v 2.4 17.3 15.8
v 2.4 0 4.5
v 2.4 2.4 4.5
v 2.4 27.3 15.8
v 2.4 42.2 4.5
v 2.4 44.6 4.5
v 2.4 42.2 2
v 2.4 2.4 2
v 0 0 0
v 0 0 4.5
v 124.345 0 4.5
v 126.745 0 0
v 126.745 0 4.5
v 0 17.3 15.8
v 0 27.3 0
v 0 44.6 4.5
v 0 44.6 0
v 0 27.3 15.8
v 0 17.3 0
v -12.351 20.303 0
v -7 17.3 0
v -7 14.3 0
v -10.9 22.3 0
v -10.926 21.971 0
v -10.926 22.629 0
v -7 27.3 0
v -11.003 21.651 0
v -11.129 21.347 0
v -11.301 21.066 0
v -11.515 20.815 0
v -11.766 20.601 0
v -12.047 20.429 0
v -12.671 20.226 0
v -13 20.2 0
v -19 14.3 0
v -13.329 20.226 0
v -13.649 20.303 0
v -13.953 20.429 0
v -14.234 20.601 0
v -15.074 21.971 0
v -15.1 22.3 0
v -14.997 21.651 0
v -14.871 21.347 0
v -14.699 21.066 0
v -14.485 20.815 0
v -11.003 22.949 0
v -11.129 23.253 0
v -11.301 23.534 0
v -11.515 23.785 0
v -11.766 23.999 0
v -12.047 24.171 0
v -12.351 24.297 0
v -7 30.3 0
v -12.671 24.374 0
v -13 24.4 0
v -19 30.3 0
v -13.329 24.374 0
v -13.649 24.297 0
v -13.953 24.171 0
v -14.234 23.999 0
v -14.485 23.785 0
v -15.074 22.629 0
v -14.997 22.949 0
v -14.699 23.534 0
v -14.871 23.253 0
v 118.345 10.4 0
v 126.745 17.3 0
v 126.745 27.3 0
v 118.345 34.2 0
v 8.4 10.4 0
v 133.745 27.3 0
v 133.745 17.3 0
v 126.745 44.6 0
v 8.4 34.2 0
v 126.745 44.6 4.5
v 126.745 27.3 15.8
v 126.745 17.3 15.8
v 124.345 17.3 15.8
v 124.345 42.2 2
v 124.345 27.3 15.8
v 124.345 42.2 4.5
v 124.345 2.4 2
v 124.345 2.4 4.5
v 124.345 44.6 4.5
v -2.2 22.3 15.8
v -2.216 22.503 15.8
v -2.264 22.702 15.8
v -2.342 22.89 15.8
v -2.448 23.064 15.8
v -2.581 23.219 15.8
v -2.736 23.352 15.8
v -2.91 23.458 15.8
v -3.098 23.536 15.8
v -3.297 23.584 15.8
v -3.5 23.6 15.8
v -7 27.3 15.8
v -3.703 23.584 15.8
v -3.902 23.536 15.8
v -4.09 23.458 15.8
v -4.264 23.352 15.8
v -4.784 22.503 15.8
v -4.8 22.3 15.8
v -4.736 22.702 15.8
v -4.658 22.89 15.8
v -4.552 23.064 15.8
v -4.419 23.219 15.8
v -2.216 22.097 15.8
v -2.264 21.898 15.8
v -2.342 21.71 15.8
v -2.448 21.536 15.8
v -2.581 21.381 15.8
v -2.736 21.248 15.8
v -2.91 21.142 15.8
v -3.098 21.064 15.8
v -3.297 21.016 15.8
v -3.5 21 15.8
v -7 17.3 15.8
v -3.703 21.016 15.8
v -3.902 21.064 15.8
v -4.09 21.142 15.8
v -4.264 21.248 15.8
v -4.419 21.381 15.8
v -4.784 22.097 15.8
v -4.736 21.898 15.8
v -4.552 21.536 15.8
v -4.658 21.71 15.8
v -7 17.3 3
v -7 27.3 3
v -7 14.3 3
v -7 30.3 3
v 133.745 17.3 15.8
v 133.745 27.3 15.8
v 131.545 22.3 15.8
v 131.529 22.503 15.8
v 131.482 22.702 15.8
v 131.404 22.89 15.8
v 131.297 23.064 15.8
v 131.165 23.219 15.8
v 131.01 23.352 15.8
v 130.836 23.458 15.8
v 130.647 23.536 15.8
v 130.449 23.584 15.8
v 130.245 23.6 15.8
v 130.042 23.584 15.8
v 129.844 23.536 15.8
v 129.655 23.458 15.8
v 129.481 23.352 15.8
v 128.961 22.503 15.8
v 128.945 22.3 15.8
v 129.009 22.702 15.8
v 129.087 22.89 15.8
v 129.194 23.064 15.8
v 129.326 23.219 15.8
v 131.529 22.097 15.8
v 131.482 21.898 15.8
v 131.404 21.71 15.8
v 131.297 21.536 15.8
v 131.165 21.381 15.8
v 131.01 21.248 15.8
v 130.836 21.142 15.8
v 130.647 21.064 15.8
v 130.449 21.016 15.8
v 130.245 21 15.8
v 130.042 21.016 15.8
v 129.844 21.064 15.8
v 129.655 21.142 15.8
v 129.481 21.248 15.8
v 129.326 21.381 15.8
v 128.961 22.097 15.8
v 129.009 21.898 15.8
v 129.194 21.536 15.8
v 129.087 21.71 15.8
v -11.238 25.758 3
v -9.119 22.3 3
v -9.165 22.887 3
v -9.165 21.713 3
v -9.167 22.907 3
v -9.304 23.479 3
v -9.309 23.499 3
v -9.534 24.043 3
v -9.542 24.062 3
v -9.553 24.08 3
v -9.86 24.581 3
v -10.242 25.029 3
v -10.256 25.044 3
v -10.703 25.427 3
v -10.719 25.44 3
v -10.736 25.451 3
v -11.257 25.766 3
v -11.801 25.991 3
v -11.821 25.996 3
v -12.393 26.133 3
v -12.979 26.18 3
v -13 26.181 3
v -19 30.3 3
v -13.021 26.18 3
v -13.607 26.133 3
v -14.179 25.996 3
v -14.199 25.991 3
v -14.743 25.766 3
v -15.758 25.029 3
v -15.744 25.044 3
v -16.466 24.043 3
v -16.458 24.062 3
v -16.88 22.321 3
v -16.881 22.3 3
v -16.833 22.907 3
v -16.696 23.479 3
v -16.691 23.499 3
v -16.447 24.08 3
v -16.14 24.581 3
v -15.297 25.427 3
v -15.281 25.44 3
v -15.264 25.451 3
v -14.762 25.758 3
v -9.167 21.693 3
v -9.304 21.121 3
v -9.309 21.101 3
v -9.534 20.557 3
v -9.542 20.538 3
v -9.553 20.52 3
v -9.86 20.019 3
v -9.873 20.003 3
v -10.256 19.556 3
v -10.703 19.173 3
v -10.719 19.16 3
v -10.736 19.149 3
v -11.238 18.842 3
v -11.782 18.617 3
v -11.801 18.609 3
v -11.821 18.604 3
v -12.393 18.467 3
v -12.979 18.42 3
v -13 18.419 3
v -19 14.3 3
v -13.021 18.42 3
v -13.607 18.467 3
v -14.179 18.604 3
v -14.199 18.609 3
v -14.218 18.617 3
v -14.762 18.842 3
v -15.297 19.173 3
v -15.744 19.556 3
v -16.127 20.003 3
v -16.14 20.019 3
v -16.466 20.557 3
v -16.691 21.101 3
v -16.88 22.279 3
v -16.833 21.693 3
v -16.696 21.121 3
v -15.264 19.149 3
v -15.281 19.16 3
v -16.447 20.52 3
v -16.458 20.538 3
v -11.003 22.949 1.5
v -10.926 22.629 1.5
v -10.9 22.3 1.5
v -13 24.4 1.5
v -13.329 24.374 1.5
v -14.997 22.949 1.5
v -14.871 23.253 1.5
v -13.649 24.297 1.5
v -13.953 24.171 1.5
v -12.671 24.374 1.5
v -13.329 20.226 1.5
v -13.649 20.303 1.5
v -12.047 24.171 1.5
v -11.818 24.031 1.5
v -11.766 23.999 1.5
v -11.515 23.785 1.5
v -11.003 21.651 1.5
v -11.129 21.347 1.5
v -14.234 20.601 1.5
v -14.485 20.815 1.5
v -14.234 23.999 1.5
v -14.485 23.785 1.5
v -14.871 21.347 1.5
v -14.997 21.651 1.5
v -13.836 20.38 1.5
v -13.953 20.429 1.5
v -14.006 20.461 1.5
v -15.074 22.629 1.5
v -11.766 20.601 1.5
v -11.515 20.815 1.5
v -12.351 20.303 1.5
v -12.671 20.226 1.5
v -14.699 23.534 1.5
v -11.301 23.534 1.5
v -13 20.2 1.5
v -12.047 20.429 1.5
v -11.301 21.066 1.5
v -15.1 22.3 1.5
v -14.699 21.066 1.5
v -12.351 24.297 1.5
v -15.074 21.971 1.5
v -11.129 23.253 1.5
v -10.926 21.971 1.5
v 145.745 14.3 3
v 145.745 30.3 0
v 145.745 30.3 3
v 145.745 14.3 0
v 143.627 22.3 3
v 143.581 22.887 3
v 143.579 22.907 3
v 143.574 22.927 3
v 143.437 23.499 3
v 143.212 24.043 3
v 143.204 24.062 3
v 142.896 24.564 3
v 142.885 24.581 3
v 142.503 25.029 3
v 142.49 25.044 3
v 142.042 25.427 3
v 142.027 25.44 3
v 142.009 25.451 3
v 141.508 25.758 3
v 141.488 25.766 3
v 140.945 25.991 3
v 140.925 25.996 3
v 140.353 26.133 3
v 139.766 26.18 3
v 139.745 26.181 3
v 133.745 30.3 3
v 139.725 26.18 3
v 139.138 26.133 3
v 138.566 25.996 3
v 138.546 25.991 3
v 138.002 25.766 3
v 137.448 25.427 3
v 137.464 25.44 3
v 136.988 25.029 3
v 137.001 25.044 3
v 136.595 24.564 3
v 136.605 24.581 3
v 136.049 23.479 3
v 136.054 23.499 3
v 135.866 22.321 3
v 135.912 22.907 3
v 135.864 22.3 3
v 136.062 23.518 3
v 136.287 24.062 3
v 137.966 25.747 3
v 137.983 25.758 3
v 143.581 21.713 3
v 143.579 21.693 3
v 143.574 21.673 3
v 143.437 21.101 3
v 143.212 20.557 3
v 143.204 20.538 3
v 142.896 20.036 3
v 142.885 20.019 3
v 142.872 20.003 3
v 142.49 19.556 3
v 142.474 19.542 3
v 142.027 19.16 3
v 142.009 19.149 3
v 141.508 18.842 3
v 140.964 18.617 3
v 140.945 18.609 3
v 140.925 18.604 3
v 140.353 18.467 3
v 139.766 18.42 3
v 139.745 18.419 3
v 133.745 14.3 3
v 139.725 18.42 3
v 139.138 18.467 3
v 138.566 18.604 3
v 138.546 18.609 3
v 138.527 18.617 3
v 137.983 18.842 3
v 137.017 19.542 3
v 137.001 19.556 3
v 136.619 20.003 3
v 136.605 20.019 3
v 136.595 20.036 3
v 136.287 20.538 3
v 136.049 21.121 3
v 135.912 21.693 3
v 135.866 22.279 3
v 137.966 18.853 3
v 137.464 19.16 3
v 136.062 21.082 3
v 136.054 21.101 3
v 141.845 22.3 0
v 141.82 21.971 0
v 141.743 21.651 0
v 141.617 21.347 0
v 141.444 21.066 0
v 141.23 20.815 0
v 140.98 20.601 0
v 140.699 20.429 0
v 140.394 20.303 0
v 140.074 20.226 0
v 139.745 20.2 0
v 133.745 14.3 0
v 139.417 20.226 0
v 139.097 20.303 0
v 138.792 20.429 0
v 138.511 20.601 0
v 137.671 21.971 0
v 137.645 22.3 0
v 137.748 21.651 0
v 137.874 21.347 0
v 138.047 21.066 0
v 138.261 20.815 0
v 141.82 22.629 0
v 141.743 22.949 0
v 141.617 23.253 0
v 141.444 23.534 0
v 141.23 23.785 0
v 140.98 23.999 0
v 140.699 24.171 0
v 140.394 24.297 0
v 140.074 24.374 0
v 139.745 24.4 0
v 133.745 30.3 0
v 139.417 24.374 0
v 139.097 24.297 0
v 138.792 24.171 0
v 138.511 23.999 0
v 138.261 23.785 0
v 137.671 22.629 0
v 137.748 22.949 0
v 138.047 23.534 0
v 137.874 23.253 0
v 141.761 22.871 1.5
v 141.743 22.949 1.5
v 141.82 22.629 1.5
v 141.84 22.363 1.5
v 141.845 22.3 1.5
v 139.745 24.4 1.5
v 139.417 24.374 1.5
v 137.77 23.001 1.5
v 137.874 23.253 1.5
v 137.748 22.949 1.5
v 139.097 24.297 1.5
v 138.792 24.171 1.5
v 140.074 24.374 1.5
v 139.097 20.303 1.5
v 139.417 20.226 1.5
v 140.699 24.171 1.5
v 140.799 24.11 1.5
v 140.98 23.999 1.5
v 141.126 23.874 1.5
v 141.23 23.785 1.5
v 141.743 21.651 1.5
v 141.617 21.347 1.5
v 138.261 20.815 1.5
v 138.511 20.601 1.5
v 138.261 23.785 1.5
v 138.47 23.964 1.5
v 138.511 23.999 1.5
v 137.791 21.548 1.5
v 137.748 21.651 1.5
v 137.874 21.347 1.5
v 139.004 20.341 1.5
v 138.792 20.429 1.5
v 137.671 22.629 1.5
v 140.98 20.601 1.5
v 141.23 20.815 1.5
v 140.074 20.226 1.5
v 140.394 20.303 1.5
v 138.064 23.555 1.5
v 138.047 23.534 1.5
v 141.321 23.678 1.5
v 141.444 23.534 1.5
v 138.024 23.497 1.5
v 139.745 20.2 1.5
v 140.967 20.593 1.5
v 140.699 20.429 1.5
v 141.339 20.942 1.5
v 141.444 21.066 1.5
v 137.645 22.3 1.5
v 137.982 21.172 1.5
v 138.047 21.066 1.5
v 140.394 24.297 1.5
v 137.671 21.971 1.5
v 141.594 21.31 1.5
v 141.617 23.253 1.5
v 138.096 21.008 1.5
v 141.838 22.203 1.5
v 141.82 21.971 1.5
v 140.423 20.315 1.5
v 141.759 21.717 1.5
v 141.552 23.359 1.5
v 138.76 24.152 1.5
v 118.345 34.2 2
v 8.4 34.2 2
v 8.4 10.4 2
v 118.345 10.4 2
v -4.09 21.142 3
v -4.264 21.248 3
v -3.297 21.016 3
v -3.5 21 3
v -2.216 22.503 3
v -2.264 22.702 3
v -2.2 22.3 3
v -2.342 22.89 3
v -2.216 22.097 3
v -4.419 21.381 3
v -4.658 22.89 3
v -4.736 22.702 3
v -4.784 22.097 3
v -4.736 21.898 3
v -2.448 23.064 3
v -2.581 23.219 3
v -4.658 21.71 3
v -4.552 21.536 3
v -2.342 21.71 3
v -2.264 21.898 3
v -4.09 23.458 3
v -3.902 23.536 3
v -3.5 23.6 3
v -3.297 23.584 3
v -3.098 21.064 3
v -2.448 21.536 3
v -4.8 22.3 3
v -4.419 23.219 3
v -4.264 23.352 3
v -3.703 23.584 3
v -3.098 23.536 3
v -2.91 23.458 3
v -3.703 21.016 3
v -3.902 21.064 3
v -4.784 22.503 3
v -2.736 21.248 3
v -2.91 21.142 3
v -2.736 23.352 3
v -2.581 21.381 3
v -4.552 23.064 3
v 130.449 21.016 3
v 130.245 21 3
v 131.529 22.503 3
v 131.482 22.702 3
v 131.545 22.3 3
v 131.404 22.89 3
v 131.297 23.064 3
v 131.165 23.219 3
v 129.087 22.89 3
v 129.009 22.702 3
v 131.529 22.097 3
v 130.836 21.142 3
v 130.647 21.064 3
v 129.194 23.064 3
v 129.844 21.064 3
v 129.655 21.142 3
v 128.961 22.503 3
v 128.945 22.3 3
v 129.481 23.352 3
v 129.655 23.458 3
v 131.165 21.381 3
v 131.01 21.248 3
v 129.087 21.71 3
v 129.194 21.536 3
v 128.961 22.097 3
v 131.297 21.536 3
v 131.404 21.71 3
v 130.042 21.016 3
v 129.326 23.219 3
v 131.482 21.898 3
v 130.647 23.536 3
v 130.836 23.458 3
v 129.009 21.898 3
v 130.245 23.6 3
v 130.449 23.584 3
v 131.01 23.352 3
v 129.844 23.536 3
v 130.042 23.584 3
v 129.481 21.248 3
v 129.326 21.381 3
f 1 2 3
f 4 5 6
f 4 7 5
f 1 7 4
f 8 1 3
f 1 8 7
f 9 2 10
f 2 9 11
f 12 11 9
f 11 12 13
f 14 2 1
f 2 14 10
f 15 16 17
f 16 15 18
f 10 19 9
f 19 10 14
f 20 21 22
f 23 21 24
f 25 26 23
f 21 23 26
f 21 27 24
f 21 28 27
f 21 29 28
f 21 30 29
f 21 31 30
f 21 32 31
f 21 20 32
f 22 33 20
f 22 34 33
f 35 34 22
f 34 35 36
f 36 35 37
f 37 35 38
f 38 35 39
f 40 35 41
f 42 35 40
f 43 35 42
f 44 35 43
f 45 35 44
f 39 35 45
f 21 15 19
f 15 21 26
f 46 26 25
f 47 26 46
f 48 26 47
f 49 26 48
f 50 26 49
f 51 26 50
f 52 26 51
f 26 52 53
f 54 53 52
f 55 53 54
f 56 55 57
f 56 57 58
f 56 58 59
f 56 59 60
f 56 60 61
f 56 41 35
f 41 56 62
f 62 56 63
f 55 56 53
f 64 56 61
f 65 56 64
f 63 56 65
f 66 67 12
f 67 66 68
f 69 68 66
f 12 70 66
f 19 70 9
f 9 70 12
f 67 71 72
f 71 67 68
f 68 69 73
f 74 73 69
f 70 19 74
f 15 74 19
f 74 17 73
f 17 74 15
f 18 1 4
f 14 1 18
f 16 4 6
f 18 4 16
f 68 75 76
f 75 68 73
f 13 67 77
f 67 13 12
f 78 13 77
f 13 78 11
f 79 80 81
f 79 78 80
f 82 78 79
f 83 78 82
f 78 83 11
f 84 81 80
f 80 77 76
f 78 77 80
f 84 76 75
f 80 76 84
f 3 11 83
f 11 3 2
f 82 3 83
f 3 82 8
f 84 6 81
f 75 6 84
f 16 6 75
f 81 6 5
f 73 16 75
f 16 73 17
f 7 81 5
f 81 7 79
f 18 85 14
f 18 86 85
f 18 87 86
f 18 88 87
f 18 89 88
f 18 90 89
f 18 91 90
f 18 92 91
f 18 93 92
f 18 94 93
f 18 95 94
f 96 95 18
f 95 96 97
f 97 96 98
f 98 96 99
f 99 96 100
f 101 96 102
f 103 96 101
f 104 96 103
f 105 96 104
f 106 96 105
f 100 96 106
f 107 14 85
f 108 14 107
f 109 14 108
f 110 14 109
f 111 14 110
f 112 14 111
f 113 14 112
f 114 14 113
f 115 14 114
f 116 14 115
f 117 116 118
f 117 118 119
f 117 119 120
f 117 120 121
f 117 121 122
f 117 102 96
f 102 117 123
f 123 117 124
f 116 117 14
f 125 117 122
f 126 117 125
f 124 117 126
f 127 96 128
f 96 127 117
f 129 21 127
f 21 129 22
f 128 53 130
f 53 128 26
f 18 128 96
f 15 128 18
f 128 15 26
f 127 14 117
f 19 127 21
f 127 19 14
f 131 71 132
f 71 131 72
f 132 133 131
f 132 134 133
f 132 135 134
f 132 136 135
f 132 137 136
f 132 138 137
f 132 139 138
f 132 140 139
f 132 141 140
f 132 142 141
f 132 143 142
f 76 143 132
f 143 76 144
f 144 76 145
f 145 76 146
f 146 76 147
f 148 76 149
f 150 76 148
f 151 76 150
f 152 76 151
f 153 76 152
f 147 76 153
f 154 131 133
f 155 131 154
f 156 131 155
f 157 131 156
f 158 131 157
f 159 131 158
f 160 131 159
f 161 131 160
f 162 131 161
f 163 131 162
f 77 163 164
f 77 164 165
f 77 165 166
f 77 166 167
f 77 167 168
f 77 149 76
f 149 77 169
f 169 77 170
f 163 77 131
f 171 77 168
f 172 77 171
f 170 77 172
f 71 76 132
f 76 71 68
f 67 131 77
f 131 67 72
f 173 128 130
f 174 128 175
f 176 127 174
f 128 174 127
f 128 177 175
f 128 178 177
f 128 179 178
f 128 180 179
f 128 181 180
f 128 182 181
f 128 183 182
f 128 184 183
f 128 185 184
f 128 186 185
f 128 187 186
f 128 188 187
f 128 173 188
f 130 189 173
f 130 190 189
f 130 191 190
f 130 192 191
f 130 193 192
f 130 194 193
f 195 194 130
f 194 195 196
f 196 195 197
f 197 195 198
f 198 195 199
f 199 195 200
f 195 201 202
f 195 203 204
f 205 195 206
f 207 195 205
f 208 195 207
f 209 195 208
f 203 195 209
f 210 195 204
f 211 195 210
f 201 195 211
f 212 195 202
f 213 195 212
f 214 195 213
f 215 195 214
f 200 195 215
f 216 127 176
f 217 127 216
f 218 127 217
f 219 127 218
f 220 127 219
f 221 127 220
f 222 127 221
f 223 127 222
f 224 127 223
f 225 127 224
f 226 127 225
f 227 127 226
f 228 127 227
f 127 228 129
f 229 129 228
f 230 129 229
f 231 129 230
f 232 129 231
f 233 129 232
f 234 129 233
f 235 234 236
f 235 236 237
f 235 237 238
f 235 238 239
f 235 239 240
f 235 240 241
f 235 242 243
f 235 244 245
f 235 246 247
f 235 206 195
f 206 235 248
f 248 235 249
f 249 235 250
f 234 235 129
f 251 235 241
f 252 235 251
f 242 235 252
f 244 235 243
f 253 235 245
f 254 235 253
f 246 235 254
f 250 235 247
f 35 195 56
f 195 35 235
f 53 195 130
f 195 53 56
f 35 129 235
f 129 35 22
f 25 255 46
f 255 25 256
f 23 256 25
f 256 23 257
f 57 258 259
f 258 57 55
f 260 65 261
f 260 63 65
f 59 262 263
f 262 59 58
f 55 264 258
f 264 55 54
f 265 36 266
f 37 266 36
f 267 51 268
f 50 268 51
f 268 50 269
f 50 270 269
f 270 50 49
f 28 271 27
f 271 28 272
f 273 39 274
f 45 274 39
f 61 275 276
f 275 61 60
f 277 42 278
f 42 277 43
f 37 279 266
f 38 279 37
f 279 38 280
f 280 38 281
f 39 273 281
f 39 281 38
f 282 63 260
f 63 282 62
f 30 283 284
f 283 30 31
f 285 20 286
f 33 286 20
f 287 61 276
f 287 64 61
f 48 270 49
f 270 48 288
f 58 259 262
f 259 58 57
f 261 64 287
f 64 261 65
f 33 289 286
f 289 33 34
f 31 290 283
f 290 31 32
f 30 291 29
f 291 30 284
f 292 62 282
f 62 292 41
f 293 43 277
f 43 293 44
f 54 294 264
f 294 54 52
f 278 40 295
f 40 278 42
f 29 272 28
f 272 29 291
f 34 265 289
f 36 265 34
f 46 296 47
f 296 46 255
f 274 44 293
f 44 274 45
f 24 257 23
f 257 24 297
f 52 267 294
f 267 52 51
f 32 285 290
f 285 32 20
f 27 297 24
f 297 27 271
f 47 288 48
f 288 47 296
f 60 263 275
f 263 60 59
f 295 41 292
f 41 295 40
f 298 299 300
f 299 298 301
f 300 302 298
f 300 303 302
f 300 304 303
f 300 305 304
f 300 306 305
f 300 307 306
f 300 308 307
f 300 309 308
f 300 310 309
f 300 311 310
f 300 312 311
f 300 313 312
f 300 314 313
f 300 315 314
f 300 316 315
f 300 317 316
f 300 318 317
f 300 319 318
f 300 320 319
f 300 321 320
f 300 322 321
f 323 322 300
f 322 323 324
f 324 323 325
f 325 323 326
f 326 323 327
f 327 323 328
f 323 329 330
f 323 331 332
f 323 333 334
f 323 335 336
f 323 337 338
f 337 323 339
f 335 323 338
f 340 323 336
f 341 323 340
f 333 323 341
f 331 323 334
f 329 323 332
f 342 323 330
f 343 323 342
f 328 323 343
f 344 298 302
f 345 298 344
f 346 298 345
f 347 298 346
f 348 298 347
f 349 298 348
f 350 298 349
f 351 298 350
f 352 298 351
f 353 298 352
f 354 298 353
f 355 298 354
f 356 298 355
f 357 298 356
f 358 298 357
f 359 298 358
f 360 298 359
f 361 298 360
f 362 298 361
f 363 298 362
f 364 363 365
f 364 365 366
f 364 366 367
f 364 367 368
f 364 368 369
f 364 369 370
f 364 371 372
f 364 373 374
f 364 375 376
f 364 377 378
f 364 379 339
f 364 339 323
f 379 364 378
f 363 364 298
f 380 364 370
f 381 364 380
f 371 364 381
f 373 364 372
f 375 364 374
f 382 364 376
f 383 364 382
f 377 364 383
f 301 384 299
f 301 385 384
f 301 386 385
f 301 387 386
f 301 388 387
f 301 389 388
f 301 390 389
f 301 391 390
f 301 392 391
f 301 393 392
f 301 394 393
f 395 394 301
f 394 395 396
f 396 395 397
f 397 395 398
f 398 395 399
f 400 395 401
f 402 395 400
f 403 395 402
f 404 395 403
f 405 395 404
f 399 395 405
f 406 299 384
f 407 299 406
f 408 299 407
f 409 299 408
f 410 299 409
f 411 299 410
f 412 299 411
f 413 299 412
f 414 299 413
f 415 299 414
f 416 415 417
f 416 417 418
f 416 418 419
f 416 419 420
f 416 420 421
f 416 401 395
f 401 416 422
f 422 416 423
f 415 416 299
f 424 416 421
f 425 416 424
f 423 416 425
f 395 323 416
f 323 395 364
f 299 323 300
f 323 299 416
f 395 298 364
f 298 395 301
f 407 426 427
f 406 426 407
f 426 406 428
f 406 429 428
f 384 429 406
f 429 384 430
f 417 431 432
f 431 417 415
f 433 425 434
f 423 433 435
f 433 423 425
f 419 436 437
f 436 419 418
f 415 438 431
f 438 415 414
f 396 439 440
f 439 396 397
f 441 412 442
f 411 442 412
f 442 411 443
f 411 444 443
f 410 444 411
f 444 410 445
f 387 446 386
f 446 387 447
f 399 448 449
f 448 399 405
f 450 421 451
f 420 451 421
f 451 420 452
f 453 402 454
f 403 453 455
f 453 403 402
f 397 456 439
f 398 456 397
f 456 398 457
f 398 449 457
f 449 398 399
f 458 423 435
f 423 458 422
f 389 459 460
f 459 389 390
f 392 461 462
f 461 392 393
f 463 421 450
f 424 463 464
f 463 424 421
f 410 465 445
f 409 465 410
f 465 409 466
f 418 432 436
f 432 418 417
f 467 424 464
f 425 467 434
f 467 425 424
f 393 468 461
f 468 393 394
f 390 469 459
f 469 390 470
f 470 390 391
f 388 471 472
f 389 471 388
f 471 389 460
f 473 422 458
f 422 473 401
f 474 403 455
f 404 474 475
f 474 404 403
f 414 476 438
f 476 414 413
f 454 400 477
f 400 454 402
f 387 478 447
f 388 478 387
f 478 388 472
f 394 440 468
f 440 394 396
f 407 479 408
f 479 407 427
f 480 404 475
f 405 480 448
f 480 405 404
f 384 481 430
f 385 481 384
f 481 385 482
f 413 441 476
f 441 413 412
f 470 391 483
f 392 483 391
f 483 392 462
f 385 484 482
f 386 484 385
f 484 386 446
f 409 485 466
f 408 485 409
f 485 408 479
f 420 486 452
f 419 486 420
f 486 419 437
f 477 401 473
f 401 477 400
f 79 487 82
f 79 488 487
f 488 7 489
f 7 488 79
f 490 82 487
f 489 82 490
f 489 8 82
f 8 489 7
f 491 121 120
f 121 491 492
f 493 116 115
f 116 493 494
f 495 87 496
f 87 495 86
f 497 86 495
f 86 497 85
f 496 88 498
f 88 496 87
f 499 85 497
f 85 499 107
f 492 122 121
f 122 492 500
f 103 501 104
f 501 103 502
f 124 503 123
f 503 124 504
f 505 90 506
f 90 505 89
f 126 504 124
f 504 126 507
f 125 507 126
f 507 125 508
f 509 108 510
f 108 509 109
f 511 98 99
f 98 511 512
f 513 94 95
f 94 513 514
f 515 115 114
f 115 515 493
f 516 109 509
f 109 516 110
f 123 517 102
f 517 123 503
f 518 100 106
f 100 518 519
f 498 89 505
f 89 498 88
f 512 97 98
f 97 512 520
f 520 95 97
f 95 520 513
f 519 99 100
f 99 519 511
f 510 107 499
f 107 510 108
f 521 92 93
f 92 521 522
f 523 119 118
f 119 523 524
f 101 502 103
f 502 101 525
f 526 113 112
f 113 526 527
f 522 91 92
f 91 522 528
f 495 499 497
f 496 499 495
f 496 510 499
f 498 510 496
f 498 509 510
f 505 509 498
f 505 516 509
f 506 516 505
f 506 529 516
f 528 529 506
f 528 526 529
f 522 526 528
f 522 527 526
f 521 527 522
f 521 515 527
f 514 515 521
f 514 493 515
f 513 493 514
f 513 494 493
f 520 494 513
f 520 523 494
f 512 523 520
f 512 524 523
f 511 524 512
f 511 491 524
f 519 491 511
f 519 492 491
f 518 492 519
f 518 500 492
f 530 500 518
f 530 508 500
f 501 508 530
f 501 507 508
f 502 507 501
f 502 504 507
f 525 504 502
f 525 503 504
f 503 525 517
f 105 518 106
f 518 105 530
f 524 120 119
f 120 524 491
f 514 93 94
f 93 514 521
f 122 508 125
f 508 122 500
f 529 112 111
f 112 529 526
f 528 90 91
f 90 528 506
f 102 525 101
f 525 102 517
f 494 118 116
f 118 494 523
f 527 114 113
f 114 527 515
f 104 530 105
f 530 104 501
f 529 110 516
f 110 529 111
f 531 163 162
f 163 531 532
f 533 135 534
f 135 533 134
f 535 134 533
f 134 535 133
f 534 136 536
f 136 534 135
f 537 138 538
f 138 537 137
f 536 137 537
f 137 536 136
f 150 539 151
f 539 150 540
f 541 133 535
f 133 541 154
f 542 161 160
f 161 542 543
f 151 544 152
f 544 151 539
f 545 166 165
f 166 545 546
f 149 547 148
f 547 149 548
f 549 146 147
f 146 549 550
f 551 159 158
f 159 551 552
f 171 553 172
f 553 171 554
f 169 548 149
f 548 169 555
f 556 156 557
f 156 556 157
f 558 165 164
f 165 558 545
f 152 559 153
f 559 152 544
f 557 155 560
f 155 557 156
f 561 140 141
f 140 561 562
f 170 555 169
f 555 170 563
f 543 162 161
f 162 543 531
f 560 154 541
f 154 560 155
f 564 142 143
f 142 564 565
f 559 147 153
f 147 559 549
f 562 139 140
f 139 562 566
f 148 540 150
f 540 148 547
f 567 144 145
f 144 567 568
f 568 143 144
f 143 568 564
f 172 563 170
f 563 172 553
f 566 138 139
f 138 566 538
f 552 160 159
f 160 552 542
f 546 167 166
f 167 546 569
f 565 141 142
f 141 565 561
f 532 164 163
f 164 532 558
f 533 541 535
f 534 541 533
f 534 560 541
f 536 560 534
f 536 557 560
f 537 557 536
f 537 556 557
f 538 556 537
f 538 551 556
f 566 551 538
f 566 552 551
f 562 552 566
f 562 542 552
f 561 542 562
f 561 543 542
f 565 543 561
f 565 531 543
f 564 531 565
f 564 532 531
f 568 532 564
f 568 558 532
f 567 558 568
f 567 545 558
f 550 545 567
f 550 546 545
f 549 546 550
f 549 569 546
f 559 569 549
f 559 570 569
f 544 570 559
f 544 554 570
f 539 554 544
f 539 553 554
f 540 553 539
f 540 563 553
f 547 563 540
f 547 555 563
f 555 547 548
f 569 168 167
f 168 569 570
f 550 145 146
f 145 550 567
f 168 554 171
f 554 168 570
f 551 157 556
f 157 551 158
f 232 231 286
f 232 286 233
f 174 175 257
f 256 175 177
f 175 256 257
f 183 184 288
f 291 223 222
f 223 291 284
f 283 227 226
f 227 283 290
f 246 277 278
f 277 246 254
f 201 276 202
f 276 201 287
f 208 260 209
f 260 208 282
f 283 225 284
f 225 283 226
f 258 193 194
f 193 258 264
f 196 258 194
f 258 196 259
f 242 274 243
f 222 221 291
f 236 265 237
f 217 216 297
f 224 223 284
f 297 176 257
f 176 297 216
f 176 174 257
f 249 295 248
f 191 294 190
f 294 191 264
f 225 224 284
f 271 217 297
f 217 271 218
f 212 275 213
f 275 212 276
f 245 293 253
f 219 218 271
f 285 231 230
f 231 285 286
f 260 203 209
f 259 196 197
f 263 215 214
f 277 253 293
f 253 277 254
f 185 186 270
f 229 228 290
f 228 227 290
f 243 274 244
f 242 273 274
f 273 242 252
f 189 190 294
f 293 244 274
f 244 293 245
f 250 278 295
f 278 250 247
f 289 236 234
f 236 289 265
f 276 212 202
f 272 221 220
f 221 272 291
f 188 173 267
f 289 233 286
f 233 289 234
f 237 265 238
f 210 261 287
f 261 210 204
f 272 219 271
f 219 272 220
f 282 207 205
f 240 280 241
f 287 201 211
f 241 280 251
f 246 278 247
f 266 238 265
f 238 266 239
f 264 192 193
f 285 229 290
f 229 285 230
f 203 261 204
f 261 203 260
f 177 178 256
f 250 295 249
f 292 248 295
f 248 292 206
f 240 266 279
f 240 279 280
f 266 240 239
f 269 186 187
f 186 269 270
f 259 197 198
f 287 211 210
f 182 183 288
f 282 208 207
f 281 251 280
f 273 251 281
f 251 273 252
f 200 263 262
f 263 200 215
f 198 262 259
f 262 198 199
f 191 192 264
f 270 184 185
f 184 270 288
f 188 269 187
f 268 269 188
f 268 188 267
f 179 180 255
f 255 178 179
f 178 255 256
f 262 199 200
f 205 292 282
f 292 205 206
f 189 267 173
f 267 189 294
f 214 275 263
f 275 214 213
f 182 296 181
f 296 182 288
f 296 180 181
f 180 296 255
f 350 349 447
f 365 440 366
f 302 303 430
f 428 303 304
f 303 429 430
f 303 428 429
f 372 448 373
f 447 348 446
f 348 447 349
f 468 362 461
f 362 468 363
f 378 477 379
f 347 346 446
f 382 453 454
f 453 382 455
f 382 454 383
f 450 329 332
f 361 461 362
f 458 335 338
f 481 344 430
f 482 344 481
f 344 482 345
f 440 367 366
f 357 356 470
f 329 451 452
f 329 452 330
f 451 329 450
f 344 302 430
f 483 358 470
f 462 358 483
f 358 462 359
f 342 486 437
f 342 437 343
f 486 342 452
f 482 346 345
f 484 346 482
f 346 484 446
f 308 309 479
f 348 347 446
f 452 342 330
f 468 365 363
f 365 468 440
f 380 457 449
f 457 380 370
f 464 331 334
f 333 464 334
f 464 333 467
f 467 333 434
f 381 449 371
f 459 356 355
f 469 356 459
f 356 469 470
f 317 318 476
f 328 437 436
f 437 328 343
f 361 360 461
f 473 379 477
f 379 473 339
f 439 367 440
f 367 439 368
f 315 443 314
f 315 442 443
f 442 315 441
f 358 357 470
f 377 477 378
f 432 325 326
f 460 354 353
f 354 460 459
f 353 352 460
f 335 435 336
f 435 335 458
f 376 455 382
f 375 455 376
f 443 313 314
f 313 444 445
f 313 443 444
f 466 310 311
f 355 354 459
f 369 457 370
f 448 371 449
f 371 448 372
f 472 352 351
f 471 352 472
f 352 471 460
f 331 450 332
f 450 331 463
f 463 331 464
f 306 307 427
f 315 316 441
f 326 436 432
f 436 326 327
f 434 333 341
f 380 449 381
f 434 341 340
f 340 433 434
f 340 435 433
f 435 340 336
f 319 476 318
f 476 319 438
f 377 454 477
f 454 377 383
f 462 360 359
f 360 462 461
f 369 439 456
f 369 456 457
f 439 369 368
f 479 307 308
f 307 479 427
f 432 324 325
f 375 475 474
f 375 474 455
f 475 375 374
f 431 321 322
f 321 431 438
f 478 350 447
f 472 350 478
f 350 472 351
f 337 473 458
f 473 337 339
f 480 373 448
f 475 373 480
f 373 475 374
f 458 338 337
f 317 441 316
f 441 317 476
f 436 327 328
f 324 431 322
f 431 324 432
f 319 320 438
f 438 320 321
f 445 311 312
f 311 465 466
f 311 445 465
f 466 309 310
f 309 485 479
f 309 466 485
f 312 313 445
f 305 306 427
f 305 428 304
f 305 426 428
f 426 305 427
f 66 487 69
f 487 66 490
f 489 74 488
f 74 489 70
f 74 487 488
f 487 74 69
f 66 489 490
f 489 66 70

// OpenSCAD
// Holder for 14 lever splice connectors (Adafruit 5619, inline 1-in/1-out)
// clipped together side by side, for the keypad wires.
// Measured block of 11 (Andrew): 95.5 wide x 39.4 long (wire direction); 13 = about 112.8
// x 14.75 tall. Open top so the levers work; wires leave both long sides.
//
// The block drops into the tray. A strap across the middle, between the
// levers, has a short peg that goes into the hole on top of each connector,
// and screws down onto the two end walls (M3 x 10 or #4 x 3/8" self-tapping).
//
// part = "fittest"       : tray only 2 connectors wide   } print these two
// part = "strap_fittest" : matching 2-connector strap     } first
// part = "holder"        : the real tray for 14
// part = "strap"         : the real strap for 14
// part = "both"          : preview, strap in place
// Print flat, no supports. The strap prints pegs up.

part = "holder";

count    = 14;            // 6 for the LED-strip holder (-D count=6)
each_w   = 95.5 / 11;     // 8.68 mm per connector: 11 measured 95.5, fit test 2 perfect (13 = about 112.8)
block_w  = count * each_w;
block_l  = 39.4;          // along the wires
block_h  = 14.75;

// ---- groove and hole on top of each connector (Andrew, 2026-10-29) ----
groove_w = 5.5;           // measured: groove across the top for a strap
groove_z = 13.8;          // measured 14.8 (connector bottom to groove floor); Andrew asked 1 mm lower after fit test 2
hole_d   = 2.74;          // measured: round hole in the groove
peg_d    = 2.65;           // peg is a little smaller than the hole
peg_h    = 2.0;           // how deep the peg goes into the hole
hole_y   = 0;             // hole centre offset from the connector's middle, along the wires
hole_x   = 0;             // hole centre offset from the connector's middle, across it

clear_w  = 0.4;           // total extra room across the block
clear_l  = 0.4;           // total extra room along the wires
wall     = 2.4;
floor_t  = 2.0;
side_lip_h = 2.5;         // low lips on the wire sides (keep below the wire holes)
boss_w   = 10;            // screw boss on each end wall, under the strap
boss_t   = 7;             // boss thickness (outward from the wall)
pilot_d  = 2.6;           // pilot hole for the strap screw
strap_w  = groove_w - 0.3; // strap sits in the groove
strap_t  = 3;
screw_d  = 3.4;           // clearance hole in the strap
ear_l    = 12;            // screw ears to fix the tray in the cabinet (#6 wood screws)
ear_hole = 4.2;
// mount = "ears": two ears with screw holes (normal)
// mount = "wing": one long flat tab with an open-ended slot on the right end, so
//                 it slides under an existing screw head (no ear on the left end)
mount    = "ears";
wing_l   = 25;            // how far the wing sticks out past the screw boss
wing_w   = 16;
wing_t   = 2.5;           // thin enough to slip under a screw head
wing_slot = 4.4;          // open slot width (#6 / M3.5 screw shank, with room)
wing_slot_l = 14;         // slot depth from the wing tip

fit      = (part == "fittest" || part == "strap_fittest");
n        = fit ? 2 : count;
in_w     = n * each_w + ((fit || n <= 2) ? 0.15 : clear_w);  // 2-wide: fit test 2 proved 0.15
in_l     = block_l + clear_l;
out_w    = in_w + 2*wall;
out_l    = in_l + 2*wall;
wall_h   = floor_t + groove_z;        // screw posts level with the groove floor,
groove_d = 0;                         // so the strap is a flat bar with no dip
yc       = out_l / 2;                 // strap centre line

$fn = 40;

module tray() {
  difference() {
    union() {
      cube([out_w, out_l, floor_t]);                          // floor
      for (x = [0, out_w - wall])                             // end walls, tapered
        translate([x, 0, 0]) end_wall();
      for (y = [0, out_l - wall])                             // low wire-side lips
        translate([0, y, 0]) cube([out_w, wall, floor_t + side_lip_h]);
      for (x = [-boss_t, out_w])                              // screw bosses
        translate([x, yc - boss_w/2, 0]) cube([boss_t, boss_w, wall_h]);
      if (!fit && mount == "wing")                            // slide-under wing
        translate([out_w + boss_t - 0.01, yc - wing_w/2, 0]) difference() {
          cube([wing_l, wing_w, wing_t]);
          translate([wing_l - wing_slot_l, wing_w/2, -1]) cylinder(d = wing_slot, h = wing_t + 2);
          translate([wing_l - wing_slot_l, wing_w/2 - wing_slot/2, -1]) cube([wing_slot_l + 1, wing_slot, wing_t + 2]);
          translate([wing_l, wing_w/2, -1]) linear_extrude(wing_t + 2)   // flared slot mouth
            polygon([[0.01, -wing_slot/2 - 1.5], [0.01, wing_slot/2 + 1.5], [-1.5, wing_slot/2], [-1.5, -wing_slot/2]]);
        }
      if (!fit && mount == "ears")                            // mounting ears
        for (x = [-boss_t - ear_l, out_w + boss_t]) translate([x, yc - 8, 0])
          difference() {
            cube([ear_l, 16, 3]);
            translate([ear_l/2, 8, -1]) cylinder(d = ear_hole, h = 5);
          }
    }
    for (x = [-boss_t/2, out_w + boss_t/2])                   // strap screw pilots
      translate([x, yc, floor_t + 1]) cylinder(d = pilot_d, h = wall_h);
    // floor window: saves plastic and lets you push the block out from below
    translate([wall + 6, wall + 8, -1]) cube([max(in_w - 12, 2), in_l - 16, floor_t + 2]);
    if (!fit && mount == "ears")
      for (x = [-boss_t - ear_l/2, out_w + boss_t + ear_l/2])
        translate([x, yc, 1.5]) cylinder(d1 = ear_hole, d2 = 8, h = 1.6);
  }
}

// End wall: full height only beside the screw post, then sloping down to lip
// height right at the holder's ends, so the levers on the end connectors are free.
module end_wall() {
  low = floor_t + side_lip_h;
  top = boss_w / 2;                     // full height only beside the screw post
  run = yc - top;                       // slope runs all the way to the holder's ends
  rotate([90, 0, 90]) linear_extrude(wall)
    polygon([[0, 0], [out_l, 0], [out_l, low],
             [yc + top + run, low], [yc + top, wall_h],
             [yc - top, wall_h], [yc - top - run, low], [0, low]]);
}

// Strap, modelled in place (bottom face on the connector tops).
module strap() {
  difference() {
    union() {
      translate([-boss_t, yc - strap_w/2, wall_h]) cube([out_w + 2*boss_t, strap_w, strap_t]);
      // the part between the end walls drops into the connectors' groove
      if (groove_d > 0)
        translate([wall + 0.2, yc - strap_w/2, wall_h - groove_d])
          cube([in_w - 0.4, strap_w, groove_d + 0.01]);
      for (i = [0 : n - 1])                                   // one peg per connector
        translate([wall + (in_w - n*each_w)/2 + (i + 0.5)*each_w + hole_x,
                   yc + hole_y, wall_h - groove_d - peg_h])
          cylinder(d1 = peg_d - 0.6, d2 = peg_d, h = 0.6 + 0.01);
      for (i = [0 : n - 1])
        translate([wall + (in_w - n*each_w)/2 + (i + 0.5)*each_w + hole_x,
                   yc + hole_y, wall_h - groove_d - peg_h + 0.6])
          cylinder(d = peg_d, h = peg_h - 0.6 + 0.01);
    }
    for (x = [-boss_t/2, out_w + boss_t/2])
      translate([x, yc, wall_h - 1]) cylinder(d = screw_d, h = strap_t + 2);
  }
}

if (part == "holder" || part == "fittest") tray();
else if (part == "strap" || part == "strap_fittest")
  translate([0, 0, wall_h + strap_t]) rotate([180, 0, 0]) translate([0, -2*yc, 0]) strap();  // pegs up (z<0 parts lifted below)
else { tray(); color("orange") strap(); }
